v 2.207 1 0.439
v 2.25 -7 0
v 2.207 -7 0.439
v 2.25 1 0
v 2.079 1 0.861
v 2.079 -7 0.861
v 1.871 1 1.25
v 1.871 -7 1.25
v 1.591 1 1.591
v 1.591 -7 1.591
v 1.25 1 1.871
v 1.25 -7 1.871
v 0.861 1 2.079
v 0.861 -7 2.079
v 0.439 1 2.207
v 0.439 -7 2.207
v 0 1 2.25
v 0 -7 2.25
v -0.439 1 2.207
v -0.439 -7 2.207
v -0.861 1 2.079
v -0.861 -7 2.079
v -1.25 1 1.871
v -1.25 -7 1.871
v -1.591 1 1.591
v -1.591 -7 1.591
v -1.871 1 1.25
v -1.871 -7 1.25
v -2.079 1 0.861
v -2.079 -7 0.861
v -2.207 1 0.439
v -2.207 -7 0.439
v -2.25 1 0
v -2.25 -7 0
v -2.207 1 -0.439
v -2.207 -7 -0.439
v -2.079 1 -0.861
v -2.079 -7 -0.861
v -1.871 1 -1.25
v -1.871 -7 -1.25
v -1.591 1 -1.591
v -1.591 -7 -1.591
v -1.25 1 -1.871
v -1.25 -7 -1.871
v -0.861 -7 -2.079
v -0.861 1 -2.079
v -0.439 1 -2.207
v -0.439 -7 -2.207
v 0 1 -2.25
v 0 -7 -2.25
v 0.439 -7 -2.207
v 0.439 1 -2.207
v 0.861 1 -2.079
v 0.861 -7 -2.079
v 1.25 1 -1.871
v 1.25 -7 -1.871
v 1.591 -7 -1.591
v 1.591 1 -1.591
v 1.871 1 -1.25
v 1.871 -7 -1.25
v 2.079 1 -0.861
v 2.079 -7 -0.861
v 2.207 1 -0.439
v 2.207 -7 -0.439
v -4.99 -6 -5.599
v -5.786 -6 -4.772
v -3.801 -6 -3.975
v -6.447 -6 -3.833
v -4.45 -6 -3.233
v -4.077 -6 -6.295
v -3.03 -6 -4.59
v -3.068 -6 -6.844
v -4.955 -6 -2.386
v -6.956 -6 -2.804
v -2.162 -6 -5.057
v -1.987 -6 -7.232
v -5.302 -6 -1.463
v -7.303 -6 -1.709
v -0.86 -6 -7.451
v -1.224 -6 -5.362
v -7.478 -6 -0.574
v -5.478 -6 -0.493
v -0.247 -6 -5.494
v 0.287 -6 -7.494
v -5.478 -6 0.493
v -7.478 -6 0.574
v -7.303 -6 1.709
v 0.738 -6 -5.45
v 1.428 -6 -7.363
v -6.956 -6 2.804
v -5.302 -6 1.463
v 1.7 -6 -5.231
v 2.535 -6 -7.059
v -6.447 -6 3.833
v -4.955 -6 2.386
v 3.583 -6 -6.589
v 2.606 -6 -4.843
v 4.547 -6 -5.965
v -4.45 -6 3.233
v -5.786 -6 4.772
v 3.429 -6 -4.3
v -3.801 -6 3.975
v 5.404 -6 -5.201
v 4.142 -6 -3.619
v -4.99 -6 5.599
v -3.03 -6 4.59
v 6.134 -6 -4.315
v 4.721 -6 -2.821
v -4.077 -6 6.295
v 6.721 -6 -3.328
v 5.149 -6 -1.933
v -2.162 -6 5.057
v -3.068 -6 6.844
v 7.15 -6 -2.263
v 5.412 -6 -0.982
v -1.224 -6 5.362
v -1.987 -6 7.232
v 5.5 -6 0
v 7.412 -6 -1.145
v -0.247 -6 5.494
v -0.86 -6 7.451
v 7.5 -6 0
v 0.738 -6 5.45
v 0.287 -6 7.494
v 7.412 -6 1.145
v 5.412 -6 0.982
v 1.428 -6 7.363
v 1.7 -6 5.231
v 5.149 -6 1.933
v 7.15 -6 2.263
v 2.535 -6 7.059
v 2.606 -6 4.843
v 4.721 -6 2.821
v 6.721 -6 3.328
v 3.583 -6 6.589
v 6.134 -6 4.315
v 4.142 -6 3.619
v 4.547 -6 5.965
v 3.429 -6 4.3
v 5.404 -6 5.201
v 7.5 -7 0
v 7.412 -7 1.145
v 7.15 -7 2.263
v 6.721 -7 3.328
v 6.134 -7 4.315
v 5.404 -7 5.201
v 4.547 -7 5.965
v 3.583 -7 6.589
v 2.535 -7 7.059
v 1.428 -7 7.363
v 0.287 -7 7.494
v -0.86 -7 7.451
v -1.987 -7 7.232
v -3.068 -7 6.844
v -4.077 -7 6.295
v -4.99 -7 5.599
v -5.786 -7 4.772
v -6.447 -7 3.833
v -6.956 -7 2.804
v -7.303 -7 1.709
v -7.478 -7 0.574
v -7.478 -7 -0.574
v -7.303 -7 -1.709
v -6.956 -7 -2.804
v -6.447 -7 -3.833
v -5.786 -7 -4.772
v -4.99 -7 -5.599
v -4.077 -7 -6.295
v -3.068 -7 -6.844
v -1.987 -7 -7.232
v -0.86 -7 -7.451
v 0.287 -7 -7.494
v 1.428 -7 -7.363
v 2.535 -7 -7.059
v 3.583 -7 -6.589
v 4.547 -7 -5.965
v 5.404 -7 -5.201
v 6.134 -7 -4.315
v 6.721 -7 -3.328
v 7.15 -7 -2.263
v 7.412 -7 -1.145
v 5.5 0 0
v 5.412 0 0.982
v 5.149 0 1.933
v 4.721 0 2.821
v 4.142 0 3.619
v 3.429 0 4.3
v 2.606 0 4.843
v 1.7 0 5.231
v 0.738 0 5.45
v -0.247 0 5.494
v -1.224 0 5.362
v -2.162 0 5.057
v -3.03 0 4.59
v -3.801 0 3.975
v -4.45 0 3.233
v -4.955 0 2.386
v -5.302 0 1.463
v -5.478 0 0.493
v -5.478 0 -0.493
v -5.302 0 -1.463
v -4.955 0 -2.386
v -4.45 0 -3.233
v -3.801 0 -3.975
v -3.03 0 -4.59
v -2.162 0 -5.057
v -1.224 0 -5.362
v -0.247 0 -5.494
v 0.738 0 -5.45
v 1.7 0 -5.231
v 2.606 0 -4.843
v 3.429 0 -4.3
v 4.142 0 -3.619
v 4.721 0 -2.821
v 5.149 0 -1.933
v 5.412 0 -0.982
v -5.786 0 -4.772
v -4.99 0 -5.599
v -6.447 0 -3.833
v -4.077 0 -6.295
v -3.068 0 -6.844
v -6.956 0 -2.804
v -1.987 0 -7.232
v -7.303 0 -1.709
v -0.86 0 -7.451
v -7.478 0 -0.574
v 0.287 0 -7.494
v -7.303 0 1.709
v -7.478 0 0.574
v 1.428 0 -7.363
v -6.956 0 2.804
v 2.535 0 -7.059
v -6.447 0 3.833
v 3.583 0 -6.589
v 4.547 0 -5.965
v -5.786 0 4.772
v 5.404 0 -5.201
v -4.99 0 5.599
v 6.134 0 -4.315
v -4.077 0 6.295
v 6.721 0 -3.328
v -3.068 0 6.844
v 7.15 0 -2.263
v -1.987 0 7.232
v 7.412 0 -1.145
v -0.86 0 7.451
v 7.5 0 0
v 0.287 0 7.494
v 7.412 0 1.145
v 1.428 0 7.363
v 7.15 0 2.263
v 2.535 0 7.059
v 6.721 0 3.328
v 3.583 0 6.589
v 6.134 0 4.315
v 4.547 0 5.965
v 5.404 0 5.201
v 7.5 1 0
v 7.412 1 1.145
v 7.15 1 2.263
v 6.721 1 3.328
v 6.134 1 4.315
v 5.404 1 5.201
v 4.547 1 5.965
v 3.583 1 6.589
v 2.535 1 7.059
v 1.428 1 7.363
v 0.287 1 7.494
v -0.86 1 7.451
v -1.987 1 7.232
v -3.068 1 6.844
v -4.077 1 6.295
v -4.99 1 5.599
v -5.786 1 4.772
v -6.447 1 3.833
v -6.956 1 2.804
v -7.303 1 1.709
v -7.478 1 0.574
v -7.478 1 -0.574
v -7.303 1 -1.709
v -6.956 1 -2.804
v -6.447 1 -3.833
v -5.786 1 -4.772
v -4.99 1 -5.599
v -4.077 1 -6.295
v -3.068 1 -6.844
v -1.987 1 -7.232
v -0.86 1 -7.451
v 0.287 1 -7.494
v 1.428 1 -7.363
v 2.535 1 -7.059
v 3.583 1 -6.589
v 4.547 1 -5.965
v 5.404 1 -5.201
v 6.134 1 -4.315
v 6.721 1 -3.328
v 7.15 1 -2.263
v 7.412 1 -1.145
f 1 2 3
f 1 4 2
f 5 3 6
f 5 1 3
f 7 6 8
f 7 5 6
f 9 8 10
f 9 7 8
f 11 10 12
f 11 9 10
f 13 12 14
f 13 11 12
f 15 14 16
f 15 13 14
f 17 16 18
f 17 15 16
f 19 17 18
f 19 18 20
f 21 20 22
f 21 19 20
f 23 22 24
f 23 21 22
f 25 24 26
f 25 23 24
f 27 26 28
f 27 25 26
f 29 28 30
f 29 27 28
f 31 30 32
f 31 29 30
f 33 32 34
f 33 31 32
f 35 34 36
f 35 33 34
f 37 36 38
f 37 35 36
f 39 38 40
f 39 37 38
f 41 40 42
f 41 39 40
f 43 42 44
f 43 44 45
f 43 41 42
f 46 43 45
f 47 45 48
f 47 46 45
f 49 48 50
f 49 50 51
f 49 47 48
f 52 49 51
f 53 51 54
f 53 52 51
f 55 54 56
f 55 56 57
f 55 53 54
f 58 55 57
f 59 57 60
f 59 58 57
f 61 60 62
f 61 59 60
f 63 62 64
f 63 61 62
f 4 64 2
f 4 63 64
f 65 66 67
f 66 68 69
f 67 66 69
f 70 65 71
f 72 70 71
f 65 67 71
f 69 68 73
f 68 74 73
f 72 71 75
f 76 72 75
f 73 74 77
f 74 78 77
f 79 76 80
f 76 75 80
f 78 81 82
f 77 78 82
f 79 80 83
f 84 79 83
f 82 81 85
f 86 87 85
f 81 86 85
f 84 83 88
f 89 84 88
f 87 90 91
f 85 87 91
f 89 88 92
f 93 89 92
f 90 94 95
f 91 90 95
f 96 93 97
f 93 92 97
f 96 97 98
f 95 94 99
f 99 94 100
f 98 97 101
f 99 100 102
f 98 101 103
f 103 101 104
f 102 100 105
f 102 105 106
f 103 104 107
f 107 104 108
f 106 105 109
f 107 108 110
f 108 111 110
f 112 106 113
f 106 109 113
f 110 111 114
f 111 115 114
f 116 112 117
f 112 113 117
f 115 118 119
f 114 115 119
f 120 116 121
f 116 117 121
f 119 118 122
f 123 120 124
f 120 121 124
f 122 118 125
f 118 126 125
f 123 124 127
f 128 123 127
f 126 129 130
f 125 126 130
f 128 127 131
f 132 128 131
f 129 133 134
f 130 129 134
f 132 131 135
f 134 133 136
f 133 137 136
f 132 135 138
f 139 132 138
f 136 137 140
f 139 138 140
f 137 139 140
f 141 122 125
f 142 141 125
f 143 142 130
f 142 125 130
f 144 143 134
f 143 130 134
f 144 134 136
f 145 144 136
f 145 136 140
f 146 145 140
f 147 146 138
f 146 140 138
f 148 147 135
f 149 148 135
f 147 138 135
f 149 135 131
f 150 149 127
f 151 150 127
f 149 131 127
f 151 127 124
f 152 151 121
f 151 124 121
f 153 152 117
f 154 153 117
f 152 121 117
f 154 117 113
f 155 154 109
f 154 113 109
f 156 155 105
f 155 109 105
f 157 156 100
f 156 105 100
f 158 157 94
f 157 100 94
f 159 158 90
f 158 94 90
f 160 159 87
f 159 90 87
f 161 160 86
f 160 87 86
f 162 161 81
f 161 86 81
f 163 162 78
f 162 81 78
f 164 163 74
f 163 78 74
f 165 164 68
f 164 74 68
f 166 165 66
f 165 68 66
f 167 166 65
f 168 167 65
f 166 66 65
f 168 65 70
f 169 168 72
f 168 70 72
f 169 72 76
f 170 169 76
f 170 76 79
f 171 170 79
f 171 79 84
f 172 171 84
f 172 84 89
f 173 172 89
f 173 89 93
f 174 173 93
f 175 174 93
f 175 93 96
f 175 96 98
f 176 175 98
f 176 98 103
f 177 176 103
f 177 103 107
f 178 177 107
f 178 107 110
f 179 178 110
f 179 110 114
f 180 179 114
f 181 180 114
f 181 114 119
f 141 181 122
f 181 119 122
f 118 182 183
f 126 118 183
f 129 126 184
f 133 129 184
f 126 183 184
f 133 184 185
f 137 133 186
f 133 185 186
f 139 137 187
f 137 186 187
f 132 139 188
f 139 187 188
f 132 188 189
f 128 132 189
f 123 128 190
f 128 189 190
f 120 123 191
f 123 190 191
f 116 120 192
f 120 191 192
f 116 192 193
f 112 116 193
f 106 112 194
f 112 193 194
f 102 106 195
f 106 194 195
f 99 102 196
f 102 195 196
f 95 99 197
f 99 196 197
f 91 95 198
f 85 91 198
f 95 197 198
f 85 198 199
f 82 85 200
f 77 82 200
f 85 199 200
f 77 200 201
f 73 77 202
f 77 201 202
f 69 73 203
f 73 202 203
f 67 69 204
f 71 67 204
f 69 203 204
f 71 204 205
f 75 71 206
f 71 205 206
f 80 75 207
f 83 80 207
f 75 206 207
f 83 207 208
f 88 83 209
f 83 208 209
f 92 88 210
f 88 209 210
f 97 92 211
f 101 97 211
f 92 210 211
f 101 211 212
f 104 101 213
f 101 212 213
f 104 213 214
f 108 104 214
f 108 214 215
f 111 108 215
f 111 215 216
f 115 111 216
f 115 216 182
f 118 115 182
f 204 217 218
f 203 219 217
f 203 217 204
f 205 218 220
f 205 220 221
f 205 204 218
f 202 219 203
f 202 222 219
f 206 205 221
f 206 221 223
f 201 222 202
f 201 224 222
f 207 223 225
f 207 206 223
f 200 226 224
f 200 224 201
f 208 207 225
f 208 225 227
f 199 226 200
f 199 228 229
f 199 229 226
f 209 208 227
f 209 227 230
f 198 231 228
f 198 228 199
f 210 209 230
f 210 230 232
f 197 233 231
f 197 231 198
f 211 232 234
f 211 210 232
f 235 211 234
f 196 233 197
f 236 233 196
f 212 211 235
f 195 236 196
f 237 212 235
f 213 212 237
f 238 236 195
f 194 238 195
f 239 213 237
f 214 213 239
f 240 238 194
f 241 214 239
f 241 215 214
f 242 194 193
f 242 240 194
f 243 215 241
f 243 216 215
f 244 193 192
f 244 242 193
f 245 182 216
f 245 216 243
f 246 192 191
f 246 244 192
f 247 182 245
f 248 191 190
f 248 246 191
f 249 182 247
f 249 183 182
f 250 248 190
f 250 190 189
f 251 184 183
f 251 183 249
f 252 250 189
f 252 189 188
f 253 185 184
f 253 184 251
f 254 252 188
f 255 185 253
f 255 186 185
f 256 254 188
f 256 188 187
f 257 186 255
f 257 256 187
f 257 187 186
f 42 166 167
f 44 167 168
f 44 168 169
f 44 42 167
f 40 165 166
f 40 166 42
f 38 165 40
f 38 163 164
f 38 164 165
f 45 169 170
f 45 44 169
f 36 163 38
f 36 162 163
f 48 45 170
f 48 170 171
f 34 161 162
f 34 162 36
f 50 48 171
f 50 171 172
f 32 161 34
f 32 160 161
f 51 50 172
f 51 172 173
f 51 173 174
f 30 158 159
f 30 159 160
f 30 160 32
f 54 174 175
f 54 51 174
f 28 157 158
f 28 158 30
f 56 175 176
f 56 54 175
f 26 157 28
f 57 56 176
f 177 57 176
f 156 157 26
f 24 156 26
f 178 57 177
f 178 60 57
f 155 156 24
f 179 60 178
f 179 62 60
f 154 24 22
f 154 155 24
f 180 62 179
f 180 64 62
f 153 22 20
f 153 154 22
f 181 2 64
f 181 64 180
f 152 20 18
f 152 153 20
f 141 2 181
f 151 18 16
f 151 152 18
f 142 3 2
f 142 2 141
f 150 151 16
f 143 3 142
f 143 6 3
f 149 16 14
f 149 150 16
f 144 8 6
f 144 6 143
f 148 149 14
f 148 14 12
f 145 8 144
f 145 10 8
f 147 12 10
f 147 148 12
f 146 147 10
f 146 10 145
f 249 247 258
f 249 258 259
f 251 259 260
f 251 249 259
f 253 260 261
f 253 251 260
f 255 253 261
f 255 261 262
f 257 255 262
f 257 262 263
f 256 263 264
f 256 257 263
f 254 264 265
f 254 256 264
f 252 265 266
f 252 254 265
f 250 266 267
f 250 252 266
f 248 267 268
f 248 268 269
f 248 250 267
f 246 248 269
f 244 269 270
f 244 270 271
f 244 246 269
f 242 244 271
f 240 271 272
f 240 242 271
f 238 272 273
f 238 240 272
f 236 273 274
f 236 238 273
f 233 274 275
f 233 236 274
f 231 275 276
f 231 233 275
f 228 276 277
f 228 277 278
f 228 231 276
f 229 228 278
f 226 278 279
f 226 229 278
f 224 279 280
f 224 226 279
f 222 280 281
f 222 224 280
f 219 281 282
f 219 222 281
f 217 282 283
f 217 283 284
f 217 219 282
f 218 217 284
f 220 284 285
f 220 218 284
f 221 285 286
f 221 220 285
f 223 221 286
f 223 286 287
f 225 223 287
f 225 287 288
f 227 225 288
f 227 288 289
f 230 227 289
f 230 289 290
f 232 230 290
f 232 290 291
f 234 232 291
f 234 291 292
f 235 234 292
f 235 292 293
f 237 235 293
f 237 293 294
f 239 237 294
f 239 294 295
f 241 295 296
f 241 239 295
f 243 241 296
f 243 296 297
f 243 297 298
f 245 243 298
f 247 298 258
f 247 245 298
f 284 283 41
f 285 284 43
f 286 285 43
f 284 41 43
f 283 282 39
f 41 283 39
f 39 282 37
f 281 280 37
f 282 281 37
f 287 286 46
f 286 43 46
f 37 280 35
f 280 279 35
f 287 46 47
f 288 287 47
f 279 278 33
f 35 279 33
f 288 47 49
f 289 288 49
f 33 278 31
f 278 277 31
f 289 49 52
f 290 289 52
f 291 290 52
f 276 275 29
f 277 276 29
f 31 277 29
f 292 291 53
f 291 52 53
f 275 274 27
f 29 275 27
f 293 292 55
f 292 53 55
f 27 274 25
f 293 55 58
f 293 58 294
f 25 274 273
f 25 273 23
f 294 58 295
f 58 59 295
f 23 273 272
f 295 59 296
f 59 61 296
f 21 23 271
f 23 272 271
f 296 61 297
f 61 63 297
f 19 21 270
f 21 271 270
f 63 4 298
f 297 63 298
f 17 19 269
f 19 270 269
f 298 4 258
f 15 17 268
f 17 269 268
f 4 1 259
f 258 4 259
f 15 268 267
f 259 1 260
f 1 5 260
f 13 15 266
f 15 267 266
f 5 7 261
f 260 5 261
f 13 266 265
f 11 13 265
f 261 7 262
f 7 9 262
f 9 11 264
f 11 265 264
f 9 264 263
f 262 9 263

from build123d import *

# Parameters (mm, degrees)
F0_R     = 7.5
F0_R_2   = 2.25
F1_DEPTH = 1
F2_R     = 5.5
F2_R_2   = 2.25
F3_DEPTH = 6
F4_R     = 7.5
F4_R_2   = 2.25
F5_DEPTH = 1


with BuildPart() as f1:
    # F0 (on Front) → F1 (new body)
    with BuildSketch(Plane.XZ):
        Circle(F0_R)
        Circle(F0_R_2, mode=Mode.SUBTRACT)
    extrude(amount=-F1_DEPTH)

    # F2 (on face) → F3 (join)
    with BuildSketch(Plane.XZ):
        Circle(F2_R)
        Circle(F2_R_2, mode=Mode.SUBTRACT)
    extrude(amount=F3_DEPTH)

    # F4 (on face) → F5 (join)
    with BuildSketch(Plane.XZ.offset(6)):
        Circle(F4_R)
        Circle(F4_R_2, mode=Mode.SUBTRACT)
    extrude(amount=F5_DEPTH)


solid = f1.part
